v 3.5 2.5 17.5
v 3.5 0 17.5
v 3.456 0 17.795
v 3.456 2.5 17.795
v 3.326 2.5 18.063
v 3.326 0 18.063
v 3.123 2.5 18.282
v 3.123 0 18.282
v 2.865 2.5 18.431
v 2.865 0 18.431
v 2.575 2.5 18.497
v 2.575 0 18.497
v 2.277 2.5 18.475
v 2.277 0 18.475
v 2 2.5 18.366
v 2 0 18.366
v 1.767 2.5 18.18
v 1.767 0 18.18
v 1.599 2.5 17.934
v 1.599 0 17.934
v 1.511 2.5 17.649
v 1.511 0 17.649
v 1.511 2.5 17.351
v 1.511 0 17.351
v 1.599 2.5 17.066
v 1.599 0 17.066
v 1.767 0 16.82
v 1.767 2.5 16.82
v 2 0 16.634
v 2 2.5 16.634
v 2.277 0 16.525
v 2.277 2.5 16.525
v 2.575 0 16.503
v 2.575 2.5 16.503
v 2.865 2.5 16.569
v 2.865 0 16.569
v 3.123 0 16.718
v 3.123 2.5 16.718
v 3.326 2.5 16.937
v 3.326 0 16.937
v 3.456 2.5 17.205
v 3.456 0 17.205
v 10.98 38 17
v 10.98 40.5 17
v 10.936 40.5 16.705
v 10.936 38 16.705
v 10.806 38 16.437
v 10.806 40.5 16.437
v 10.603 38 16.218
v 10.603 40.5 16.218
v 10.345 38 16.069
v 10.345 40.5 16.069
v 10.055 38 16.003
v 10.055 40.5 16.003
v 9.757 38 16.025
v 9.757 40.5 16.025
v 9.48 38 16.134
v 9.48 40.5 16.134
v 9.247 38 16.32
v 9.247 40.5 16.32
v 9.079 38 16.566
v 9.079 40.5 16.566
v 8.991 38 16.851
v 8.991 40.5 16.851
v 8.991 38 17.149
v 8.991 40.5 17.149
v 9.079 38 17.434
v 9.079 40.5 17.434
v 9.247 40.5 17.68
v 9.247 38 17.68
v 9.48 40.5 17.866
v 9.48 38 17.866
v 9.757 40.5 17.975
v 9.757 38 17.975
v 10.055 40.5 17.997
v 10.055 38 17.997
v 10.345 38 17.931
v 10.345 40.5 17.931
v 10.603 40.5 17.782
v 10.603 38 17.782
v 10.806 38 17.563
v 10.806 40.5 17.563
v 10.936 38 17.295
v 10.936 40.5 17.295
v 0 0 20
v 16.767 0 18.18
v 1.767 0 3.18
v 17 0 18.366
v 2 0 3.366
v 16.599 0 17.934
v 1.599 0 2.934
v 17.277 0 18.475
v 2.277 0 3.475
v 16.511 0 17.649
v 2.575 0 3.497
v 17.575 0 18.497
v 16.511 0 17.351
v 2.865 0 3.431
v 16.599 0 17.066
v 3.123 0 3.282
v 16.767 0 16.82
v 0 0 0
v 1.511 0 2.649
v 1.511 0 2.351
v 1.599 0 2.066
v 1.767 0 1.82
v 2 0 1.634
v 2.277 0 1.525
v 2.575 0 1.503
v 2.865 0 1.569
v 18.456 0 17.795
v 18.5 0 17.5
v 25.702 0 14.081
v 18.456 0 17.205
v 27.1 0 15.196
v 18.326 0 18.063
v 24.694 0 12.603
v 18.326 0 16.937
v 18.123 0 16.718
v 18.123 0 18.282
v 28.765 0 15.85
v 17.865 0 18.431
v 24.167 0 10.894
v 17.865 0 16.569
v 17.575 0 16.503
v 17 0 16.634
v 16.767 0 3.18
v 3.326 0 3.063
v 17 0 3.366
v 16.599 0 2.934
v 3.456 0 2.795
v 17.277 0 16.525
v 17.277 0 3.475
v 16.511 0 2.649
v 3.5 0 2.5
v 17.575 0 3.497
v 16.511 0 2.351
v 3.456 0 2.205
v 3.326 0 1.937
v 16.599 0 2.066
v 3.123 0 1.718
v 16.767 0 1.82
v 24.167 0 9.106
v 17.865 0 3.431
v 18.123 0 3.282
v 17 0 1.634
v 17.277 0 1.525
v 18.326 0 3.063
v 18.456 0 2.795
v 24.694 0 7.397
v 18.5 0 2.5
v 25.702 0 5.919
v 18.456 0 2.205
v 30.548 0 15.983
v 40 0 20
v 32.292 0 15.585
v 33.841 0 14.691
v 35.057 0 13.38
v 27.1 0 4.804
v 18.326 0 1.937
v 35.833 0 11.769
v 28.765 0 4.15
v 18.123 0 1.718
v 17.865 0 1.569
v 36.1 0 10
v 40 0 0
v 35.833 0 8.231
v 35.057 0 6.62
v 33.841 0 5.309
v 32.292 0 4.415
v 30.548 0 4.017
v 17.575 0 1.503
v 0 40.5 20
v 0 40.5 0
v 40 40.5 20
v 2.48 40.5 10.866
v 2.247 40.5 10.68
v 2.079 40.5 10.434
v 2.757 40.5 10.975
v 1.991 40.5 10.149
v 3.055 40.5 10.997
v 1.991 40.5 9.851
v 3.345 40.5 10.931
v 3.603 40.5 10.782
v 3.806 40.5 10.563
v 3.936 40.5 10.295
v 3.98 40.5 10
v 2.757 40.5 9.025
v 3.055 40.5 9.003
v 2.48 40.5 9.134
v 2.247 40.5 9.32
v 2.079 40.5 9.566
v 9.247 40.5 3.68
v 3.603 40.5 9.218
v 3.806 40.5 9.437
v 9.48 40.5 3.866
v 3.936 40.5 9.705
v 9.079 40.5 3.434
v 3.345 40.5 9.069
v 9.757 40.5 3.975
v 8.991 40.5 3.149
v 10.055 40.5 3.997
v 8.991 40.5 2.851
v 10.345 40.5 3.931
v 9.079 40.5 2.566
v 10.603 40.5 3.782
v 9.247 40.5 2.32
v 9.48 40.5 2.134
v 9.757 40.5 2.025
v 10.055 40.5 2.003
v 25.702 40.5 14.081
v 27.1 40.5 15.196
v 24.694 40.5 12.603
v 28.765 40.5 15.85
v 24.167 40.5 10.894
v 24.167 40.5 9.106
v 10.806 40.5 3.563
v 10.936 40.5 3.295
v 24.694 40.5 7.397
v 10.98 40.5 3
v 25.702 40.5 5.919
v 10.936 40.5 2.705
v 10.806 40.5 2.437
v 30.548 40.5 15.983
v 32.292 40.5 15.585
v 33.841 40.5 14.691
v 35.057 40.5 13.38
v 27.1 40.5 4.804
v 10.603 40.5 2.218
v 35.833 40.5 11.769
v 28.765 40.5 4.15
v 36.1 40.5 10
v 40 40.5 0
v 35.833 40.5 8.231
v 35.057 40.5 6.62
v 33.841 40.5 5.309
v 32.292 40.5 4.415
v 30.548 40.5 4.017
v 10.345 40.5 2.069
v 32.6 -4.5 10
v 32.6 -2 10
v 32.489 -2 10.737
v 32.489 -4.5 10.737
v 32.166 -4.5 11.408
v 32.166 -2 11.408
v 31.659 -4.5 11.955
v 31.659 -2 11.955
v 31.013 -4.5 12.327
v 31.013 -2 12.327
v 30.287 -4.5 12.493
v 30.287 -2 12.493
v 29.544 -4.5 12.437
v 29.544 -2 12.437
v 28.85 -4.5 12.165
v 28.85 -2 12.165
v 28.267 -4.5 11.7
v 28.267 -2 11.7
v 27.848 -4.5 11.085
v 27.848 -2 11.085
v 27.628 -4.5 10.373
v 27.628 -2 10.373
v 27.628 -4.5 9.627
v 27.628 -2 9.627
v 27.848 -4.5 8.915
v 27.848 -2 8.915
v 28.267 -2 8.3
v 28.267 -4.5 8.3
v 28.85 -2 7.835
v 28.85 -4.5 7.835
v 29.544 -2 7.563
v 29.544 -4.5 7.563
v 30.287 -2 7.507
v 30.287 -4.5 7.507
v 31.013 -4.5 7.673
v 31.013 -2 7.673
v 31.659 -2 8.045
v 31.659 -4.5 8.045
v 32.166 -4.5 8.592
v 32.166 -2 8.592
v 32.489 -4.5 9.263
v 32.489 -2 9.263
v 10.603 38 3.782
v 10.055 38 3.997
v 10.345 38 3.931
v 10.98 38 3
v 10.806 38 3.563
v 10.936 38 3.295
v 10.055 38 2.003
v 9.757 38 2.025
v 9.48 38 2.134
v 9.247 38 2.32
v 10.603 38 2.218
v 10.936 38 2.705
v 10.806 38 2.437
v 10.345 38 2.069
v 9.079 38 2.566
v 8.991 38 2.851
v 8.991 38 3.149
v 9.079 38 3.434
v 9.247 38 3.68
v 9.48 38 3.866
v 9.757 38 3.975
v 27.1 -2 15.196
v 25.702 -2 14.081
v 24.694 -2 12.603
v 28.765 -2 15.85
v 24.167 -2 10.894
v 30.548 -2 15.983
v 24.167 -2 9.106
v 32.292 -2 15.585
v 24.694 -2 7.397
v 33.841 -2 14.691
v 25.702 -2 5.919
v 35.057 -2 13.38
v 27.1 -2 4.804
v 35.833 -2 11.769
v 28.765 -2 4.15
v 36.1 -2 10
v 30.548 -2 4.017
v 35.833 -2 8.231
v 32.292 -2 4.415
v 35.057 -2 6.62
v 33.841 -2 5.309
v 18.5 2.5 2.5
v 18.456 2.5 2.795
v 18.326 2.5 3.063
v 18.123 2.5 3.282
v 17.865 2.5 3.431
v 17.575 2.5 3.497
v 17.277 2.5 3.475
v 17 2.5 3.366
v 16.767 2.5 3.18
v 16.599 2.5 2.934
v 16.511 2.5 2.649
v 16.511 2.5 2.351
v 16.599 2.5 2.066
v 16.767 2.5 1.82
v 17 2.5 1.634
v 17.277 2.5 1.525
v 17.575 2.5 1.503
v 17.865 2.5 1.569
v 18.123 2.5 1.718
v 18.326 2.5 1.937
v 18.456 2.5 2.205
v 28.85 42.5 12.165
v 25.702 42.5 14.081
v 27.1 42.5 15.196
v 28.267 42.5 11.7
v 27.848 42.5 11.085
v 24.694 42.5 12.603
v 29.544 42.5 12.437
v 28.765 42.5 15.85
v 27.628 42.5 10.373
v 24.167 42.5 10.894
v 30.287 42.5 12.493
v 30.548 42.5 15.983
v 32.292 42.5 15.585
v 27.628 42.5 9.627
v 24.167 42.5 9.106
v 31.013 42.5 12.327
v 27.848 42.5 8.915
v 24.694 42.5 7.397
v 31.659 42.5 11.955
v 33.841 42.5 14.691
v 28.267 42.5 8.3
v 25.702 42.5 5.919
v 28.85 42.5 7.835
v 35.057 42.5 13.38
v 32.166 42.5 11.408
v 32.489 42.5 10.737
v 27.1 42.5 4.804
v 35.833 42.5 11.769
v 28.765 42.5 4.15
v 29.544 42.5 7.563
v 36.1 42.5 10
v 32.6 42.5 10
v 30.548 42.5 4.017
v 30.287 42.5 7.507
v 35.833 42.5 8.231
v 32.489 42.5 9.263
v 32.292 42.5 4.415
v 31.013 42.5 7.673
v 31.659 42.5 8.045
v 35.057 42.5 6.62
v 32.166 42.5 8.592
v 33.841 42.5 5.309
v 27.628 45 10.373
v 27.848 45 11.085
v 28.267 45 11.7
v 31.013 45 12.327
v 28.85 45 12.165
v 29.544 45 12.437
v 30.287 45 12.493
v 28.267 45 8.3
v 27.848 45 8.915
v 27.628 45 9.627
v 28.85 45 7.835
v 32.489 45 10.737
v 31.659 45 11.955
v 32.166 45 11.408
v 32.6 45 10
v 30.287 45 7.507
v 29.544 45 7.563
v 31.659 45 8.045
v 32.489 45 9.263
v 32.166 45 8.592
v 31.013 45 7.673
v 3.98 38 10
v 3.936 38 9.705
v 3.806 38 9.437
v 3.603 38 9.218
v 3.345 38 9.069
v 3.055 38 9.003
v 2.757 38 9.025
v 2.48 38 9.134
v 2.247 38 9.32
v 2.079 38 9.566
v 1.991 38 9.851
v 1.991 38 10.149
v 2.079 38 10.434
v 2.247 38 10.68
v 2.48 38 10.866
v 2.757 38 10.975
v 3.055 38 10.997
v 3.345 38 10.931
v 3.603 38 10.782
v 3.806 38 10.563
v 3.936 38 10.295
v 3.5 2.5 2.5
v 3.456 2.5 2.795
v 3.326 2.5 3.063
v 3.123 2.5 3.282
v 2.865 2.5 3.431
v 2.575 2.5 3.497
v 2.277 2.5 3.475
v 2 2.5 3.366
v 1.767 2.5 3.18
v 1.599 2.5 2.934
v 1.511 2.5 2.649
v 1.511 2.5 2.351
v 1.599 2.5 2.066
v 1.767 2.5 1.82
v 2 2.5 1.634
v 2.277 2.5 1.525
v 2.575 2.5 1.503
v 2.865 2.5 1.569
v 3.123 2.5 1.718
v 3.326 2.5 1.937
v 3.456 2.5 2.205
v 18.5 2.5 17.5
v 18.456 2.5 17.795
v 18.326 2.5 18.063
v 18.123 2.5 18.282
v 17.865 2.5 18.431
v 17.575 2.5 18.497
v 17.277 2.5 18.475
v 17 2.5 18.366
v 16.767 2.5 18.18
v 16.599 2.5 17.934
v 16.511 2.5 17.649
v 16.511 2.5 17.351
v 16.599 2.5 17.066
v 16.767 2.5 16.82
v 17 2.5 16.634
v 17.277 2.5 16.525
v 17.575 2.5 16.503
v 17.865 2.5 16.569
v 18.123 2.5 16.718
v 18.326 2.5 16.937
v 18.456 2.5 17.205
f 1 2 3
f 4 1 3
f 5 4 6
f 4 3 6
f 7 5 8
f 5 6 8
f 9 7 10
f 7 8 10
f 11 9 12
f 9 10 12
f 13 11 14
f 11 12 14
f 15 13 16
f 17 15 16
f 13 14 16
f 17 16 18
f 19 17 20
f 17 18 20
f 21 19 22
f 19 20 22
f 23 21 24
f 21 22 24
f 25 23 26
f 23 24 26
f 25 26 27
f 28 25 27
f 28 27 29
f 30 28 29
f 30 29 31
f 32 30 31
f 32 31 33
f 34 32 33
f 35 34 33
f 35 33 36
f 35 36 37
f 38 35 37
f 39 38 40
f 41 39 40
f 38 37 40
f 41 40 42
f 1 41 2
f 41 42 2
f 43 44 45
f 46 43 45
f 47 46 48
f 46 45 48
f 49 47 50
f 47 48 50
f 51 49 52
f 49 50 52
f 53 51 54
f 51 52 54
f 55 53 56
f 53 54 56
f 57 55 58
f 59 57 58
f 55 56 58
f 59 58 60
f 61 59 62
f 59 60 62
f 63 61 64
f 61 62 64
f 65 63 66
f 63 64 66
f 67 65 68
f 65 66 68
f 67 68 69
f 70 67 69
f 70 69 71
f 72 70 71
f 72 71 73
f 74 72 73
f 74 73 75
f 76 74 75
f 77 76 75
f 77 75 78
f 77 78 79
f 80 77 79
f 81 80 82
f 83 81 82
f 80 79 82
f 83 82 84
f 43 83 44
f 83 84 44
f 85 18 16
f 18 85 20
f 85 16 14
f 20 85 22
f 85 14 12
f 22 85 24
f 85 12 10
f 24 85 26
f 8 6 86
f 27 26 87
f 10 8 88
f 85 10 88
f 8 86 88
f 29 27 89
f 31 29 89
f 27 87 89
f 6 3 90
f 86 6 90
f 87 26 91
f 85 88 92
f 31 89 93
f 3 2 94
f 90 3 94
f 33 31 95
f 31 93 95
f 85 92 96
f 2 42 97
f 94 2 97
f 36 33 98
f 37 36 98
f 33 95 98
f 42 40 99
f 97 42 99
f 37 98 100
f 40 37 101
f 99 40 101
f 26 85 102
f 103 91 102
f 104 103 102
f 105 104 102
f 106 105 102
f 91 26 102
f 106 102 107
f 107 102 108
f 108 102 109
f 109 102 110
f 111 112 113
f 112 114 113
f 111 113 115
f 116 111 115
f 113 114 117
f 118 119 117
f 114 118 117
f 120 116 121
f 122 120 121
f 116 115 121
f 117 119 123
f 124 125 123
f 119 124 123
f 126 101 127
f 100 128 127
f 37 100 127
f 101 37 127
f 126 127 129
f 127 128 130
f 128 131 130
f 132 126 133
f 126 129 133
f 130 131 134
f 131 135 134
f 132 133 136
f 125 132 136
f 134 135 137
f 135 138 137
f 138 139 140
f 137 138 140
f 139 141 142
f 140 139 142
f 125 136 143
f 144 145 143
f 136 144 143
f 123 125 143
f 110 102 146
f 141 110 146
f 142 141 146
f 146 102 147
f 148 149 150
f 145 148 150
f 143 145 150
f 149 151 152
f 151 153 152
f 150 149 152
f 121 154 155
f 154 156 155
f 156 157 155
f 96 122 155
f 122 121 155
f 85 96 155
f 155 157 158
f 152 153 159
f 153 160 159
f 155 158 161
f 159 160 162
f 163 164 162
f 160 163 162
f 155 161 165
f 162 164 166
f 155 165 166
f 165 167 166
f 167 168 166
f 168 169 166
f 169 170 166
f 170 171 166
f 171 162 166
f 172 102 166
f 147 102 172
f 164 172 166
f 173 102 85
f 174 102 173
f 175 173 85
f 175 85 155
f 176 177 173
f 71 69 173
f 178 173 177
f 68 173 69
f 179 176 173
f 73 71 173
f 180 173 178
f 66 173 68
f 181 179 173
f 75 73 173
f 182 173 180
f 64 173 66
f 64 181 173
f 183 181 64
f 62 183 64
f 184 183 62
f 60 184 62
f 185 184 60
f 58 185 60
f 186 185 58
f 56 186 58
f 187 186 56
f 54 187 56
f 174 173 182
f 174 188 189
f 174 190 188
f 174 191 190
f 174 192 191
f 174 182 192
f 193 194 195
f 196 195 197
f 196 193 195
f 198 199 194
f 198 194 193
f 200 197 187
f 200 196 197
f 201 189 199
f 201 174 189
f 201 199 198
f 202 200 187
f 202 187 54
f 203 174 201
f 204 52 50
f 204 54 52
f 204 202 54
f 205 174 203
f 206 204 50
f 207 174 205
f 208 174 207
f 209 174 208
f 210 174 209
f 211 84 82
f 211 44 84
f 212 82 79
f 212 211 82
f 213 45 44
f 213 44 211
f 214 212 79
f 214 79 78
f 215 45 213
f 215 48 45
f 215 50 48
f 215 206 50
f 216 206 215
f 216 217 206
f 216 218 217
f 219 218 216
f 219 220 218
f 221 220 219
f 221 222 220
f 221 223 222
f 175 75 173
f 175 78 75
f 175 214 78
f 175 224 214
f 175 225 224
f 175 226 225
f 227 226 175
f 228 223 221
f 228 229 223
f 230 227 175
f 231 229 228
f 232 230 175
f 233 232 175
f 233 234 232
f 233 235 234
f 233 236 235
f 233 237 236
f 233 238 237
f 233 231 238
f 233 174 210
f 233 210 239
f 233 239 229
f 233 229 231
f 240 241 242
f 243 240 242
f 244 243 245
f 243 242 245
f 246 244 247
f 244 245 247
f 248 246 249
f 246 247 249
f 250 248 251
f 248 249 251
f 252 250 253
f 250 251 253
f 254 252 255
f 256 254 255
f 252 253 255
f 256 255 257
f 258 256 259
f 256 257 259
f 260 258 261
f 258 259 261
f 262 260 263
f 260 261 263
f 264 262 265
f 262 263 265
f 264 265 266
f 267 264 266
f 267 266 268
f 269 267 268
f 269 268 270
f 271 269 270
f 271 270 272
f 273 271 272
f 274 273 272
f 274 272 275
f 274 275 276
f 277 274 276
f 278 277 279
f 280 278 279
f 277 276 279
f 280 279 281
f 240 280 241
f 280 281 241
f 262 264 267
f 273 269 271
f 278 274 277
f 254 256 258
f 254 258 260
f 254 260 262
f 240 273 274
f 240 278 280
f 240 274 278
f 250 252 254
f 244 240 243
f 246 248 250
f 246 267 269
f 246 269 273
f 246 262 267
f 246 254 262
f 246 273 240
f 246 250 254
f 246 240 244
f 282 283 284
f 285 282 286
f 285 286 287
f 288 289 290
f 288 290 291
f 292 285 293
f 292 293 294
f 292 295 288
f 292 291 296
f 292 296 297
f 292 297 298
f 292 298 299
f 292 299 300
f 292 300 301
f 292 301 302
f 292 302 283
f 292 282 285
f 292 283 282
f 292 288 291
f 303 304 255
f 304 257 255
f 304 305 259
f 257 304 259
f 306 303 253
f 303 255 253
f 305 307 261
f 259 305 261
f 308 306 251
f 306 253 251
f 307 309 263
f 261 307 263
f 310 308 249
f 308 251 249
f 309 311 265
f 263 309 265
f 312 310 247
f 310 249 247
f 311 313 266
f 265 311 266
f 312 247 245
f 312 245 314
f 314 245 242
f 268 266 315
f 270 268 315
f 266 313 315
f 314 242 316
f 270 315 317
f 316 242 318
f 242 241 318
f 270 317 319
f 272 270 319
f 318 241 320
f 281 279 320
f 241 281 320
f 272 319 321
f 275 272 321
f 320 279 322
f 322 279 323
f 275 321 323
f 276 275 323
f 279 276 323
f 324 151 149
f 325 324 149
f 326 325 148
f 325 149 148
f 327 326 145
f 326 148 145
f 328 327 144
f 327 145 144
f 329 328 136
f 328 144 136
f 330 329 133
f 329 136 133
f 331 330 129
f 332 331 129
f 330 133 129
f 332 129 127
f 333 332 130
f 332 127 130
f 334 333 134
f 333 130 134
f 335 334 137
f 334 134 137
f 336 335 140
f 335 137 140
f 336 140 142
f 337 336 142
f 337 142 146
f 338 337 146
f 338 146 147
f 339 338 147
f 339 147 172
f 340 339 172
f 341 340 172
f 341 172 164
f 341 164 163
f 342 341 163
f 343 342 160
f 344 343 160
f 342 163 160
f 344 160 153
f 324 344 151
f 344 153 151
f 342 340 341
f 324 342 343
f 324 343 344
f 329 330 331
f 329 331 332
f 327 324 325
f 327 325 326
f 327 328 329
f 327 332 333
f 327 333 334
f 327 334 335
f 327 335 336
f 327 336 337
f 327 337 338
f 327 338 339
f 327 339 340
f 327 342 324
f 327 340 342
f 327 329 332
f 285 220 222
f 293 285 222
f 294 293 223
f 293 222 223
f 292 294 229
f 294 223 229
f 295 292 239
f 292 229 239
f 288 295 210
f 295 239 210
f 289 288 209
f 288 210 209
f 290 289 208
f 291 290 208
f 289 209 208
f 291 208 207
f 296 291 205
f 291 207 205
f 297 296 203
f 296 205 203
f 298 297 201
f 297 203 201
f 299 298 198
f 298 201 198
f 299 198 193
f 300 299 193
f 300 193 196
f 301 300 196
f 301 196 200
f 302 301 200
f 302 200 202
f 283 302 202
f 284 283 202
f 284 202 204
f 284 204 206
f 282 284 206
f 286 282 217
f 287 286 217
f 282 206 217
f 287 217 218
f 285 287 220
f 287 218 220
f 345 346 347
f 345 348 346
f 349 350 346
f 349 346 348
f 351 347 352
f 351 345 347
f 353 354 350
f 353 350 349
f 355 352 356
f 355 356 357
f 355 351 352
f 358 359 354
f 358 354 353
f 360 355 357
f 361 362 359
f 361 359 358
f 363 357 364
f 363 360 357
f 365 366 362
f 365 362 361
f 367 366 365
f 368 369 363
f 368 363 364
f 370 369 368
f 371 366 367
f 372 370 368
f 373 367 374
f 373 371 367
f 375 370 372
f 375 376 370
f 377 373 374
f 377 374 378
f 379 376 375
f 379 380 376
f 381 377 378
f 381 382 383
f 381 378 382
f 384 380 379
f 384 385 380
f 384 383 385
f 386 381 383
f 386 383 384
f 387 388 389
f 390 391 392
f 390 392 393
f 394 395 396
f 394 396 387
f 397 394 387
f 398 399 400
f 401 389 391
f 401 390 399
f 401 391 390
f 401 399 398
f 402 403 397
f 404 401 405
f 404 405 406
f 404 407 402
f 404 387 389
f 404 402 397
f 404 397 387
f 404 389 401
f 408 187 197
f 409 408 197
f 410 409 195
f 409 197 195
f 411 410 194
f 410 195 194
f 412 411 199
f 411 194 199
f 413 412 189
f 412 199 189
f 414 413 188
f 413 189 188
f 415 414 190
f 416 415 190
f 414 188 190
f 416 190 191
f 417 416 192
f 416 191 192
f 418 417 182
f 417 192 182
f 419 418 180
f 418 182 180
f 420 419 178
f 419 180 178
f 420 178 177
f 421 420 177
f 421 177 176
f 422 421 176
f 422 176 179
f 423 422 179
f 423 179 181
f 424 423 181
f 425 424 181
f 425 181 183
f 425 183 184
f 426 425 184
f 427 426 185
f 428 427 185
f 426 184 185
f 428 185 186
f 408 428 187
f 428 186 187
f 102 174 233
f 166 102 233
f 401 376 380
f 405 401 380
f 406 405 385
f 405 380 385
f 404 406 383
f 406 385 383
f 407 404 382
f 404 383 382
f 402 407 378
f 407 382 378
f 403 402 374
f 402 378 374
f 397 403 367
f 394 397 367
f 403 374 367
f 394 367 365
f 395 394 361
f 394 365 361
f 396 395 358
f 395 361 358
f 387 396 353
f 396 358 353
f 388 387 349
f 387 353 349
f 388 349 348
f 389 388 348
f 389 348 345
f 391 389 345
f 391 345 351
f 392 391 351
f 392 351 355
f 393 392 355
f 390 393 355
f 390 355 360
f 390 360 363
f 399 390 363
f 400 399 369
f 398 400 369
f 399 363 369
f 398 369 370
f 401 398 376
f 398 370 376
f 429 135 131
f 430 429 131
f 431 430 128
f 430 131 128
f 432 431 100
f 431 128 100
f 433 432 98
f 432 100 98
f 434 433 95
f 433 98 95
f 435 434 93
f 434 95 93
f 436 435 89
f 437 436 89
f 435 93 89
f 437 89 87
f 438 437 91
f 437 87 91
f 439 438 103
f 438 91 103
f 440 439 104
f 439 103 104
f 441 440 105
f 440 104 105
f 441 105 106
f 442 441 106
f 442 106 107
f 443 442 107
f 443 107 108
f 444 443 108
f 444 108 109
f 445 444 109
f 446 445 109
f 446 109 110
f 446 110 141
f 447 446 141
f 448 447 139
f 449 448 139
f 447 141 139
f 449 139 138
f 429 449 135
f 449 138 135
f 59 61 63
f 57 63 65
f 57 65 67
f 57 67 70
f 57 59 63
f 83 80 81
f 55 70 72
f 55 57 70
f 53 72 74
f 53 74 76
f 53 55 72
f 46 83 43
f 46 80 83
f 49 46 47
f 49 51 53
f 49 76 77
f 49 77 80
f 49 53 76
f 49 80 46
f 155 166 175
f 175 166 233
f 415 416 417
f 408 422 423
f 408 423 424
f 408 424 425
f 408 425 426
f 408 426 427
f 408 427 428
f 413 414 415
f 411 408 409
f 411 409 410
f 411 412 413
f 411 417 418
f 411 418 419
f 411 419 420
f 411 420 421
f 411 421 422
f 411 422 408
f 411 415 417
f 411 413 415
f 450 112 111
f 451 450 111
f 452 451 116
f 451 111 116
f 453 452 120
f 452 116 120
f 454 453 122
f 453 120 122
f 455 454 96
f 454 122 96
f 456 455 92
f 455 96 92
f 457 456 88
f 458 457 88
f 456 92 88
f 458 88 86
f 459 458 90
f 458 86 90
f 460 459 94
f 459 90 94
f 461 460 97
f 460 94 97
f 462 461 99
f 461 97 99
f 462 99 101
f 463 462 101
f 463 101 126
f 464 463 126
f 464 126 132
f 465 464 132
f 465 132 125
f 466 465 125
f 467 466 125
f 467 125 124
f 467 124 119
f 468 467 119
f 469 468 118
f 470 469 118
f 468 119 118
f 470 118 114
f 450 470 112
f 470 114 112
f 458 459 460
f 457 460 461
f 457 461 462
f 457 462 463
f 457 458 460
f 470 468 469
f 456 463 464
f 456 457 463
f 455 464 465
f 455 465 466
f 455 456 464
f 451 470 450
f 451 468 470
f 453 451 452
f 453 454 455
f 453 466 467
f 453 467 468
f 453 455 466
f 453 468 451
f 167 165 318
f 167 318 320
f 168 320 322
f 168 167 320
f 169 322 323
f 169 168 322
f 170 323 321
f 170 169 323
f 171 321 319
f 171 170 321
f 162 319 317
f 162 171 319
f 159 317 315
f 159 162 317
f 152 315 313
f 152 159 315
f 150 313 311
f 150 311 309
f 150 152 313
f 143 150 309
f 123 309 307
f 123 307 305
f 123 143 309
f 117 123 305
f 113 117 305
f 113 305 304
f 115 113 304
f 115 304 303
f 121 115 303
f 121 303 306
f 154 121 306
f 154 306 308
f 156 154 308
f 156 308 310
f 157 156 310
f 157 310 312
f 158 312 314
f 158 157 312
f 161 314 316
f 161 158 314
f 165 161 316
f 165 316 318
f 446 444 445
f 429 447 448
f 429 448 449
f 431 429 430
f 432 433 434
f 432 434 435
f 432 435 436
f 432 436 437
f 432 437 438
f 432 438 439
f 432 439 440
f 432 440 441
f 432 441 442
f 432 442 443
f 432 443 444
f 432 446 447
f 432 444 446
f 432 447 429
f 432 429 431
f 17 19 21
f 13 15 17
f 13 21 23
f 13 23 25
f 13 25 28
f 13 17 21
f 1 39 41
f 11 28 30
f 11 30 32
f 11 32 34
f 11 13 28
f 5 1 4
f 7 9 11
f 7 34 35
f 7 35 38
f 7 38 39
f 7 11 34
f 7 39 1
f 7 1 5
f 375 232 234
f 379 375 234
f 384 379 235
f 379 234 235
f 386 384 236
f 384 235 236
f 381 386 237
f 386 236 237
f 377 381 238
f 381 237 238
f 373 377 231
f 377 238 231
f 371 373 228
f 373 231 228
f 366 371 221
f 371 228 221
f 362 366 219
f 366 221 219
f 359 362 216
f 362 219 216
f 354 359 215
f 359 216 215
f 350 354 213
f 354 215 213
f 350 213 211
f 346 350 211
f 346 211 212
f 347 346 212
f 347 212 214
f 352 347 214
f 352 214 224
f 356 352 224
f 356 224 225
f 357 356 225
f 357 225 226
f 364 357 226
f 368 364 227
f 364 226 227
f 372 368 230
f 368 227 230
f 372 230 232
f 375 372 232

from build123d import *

# Parameters (mm, degrees)
SKETCH_1_W          = 40
SKETCH_1_H          = 40.5
EXTRUDE_1_DEPTH     = 20
SKETCH_2_R          = 6
EXTRUDE_2_DEPTH     = 2
SKETCH_4_R          = 2.5
EXTRUDE_3_DEPTH     = 2.5
SKETCH_5_R          = 2.5
EXTRUDE_4_DEPTH     = 2.5
SKETCH_6_R          = 1
CUT_EXTRUDE_1_DEPTH = 2.5
SKETCH_7_R          = 1
CUT_EXTRUDE_2_DEPTH = 2.5


with BuildPart() as part:
    # 草图1 → 凸台-拉伸1 (new body)
    with BuildSketch(Plane.XY):
        with Locations((20, 20.25)):
            Rectangle(SKETCH_1_W, SKETCH_1_H)
    extrude(amount=EXTRUDE_1_DEPTH)

    # 草图2 → 凸台-拉伸2 (add)
    with BuildSketch(Plane(origin=(0, 40.5, 0), x_dir=(1, 0, 0), z_dir=(0, 1, 0))):
        with Locations((30.1, -10)):
            Circle(SKETCH_2_R)
    extrude_2 = extrude(amount=EXTRUDE_2_DEPTH)

    # 镜向1: 凸台-拉伸2 across plane
    add(extrude_2.mirror(Plane.ZX.offset(20.25)))

    # 草图4 → 凸台-拉伸3 (add)
    with BuildSketch(Plane(origin=(0, 42.5, 0), x_dir=(1, 0, 0), z_dir=(0, 1, 0))):
        with Locations((30.1, -10)):
            Circle(SKETCH_4_R)
    extrude(amount=EXTRUDE_3_DEPTH)

    # 草图5 → 凸台-拉伸4 (add)
    with BuildSketch(Plane.XZ.offset(2)):
        with Locations((30.1, 10)):
            Circle(SKETCH_5_R)
    extrude(amount=EXTRUDE_4_DEPTH)

    # 草图6 → 切除-拉伸1 (cut)
    with BuildSketch(Plane(origin=(0, 40.5, 0), x_dir=(1, 0, 0), z_dir=(0, 1, 0))):
        with Locations((9.98, -3)):
            Circle(SKETCH_6_R)
        with Locations((9.98, -17)):
            Circle(SKETCH_6_R)
        with Locations((2.98, -10)):
            Circle(SKETCH_6_R)
    extrude(amount=-CUT_EXTRUDE_1_DEPTH, mode=Mode.SUBTRACT)

    # 草图7 → 切除-拉伸2 (cut)
    with BuildSketch(Plane.XZ):
        with Locations((2.5, 17.5)):
            Circle(SKETCH_7_R)
        with Locations((17.5, 17.5)):
            Circle(SKETCH_7_R)
        with Locations((17.5, 2.5)):
            Circle(SKETCH_7_R)
        with Locations((2.5, 2.5)):
            Circle(SKETCH_7_R)
    extrude(amount=-CUT_EXTRUDE_2_DEPTH, mode=Mode.SUBTRACT)


solid = part.part
